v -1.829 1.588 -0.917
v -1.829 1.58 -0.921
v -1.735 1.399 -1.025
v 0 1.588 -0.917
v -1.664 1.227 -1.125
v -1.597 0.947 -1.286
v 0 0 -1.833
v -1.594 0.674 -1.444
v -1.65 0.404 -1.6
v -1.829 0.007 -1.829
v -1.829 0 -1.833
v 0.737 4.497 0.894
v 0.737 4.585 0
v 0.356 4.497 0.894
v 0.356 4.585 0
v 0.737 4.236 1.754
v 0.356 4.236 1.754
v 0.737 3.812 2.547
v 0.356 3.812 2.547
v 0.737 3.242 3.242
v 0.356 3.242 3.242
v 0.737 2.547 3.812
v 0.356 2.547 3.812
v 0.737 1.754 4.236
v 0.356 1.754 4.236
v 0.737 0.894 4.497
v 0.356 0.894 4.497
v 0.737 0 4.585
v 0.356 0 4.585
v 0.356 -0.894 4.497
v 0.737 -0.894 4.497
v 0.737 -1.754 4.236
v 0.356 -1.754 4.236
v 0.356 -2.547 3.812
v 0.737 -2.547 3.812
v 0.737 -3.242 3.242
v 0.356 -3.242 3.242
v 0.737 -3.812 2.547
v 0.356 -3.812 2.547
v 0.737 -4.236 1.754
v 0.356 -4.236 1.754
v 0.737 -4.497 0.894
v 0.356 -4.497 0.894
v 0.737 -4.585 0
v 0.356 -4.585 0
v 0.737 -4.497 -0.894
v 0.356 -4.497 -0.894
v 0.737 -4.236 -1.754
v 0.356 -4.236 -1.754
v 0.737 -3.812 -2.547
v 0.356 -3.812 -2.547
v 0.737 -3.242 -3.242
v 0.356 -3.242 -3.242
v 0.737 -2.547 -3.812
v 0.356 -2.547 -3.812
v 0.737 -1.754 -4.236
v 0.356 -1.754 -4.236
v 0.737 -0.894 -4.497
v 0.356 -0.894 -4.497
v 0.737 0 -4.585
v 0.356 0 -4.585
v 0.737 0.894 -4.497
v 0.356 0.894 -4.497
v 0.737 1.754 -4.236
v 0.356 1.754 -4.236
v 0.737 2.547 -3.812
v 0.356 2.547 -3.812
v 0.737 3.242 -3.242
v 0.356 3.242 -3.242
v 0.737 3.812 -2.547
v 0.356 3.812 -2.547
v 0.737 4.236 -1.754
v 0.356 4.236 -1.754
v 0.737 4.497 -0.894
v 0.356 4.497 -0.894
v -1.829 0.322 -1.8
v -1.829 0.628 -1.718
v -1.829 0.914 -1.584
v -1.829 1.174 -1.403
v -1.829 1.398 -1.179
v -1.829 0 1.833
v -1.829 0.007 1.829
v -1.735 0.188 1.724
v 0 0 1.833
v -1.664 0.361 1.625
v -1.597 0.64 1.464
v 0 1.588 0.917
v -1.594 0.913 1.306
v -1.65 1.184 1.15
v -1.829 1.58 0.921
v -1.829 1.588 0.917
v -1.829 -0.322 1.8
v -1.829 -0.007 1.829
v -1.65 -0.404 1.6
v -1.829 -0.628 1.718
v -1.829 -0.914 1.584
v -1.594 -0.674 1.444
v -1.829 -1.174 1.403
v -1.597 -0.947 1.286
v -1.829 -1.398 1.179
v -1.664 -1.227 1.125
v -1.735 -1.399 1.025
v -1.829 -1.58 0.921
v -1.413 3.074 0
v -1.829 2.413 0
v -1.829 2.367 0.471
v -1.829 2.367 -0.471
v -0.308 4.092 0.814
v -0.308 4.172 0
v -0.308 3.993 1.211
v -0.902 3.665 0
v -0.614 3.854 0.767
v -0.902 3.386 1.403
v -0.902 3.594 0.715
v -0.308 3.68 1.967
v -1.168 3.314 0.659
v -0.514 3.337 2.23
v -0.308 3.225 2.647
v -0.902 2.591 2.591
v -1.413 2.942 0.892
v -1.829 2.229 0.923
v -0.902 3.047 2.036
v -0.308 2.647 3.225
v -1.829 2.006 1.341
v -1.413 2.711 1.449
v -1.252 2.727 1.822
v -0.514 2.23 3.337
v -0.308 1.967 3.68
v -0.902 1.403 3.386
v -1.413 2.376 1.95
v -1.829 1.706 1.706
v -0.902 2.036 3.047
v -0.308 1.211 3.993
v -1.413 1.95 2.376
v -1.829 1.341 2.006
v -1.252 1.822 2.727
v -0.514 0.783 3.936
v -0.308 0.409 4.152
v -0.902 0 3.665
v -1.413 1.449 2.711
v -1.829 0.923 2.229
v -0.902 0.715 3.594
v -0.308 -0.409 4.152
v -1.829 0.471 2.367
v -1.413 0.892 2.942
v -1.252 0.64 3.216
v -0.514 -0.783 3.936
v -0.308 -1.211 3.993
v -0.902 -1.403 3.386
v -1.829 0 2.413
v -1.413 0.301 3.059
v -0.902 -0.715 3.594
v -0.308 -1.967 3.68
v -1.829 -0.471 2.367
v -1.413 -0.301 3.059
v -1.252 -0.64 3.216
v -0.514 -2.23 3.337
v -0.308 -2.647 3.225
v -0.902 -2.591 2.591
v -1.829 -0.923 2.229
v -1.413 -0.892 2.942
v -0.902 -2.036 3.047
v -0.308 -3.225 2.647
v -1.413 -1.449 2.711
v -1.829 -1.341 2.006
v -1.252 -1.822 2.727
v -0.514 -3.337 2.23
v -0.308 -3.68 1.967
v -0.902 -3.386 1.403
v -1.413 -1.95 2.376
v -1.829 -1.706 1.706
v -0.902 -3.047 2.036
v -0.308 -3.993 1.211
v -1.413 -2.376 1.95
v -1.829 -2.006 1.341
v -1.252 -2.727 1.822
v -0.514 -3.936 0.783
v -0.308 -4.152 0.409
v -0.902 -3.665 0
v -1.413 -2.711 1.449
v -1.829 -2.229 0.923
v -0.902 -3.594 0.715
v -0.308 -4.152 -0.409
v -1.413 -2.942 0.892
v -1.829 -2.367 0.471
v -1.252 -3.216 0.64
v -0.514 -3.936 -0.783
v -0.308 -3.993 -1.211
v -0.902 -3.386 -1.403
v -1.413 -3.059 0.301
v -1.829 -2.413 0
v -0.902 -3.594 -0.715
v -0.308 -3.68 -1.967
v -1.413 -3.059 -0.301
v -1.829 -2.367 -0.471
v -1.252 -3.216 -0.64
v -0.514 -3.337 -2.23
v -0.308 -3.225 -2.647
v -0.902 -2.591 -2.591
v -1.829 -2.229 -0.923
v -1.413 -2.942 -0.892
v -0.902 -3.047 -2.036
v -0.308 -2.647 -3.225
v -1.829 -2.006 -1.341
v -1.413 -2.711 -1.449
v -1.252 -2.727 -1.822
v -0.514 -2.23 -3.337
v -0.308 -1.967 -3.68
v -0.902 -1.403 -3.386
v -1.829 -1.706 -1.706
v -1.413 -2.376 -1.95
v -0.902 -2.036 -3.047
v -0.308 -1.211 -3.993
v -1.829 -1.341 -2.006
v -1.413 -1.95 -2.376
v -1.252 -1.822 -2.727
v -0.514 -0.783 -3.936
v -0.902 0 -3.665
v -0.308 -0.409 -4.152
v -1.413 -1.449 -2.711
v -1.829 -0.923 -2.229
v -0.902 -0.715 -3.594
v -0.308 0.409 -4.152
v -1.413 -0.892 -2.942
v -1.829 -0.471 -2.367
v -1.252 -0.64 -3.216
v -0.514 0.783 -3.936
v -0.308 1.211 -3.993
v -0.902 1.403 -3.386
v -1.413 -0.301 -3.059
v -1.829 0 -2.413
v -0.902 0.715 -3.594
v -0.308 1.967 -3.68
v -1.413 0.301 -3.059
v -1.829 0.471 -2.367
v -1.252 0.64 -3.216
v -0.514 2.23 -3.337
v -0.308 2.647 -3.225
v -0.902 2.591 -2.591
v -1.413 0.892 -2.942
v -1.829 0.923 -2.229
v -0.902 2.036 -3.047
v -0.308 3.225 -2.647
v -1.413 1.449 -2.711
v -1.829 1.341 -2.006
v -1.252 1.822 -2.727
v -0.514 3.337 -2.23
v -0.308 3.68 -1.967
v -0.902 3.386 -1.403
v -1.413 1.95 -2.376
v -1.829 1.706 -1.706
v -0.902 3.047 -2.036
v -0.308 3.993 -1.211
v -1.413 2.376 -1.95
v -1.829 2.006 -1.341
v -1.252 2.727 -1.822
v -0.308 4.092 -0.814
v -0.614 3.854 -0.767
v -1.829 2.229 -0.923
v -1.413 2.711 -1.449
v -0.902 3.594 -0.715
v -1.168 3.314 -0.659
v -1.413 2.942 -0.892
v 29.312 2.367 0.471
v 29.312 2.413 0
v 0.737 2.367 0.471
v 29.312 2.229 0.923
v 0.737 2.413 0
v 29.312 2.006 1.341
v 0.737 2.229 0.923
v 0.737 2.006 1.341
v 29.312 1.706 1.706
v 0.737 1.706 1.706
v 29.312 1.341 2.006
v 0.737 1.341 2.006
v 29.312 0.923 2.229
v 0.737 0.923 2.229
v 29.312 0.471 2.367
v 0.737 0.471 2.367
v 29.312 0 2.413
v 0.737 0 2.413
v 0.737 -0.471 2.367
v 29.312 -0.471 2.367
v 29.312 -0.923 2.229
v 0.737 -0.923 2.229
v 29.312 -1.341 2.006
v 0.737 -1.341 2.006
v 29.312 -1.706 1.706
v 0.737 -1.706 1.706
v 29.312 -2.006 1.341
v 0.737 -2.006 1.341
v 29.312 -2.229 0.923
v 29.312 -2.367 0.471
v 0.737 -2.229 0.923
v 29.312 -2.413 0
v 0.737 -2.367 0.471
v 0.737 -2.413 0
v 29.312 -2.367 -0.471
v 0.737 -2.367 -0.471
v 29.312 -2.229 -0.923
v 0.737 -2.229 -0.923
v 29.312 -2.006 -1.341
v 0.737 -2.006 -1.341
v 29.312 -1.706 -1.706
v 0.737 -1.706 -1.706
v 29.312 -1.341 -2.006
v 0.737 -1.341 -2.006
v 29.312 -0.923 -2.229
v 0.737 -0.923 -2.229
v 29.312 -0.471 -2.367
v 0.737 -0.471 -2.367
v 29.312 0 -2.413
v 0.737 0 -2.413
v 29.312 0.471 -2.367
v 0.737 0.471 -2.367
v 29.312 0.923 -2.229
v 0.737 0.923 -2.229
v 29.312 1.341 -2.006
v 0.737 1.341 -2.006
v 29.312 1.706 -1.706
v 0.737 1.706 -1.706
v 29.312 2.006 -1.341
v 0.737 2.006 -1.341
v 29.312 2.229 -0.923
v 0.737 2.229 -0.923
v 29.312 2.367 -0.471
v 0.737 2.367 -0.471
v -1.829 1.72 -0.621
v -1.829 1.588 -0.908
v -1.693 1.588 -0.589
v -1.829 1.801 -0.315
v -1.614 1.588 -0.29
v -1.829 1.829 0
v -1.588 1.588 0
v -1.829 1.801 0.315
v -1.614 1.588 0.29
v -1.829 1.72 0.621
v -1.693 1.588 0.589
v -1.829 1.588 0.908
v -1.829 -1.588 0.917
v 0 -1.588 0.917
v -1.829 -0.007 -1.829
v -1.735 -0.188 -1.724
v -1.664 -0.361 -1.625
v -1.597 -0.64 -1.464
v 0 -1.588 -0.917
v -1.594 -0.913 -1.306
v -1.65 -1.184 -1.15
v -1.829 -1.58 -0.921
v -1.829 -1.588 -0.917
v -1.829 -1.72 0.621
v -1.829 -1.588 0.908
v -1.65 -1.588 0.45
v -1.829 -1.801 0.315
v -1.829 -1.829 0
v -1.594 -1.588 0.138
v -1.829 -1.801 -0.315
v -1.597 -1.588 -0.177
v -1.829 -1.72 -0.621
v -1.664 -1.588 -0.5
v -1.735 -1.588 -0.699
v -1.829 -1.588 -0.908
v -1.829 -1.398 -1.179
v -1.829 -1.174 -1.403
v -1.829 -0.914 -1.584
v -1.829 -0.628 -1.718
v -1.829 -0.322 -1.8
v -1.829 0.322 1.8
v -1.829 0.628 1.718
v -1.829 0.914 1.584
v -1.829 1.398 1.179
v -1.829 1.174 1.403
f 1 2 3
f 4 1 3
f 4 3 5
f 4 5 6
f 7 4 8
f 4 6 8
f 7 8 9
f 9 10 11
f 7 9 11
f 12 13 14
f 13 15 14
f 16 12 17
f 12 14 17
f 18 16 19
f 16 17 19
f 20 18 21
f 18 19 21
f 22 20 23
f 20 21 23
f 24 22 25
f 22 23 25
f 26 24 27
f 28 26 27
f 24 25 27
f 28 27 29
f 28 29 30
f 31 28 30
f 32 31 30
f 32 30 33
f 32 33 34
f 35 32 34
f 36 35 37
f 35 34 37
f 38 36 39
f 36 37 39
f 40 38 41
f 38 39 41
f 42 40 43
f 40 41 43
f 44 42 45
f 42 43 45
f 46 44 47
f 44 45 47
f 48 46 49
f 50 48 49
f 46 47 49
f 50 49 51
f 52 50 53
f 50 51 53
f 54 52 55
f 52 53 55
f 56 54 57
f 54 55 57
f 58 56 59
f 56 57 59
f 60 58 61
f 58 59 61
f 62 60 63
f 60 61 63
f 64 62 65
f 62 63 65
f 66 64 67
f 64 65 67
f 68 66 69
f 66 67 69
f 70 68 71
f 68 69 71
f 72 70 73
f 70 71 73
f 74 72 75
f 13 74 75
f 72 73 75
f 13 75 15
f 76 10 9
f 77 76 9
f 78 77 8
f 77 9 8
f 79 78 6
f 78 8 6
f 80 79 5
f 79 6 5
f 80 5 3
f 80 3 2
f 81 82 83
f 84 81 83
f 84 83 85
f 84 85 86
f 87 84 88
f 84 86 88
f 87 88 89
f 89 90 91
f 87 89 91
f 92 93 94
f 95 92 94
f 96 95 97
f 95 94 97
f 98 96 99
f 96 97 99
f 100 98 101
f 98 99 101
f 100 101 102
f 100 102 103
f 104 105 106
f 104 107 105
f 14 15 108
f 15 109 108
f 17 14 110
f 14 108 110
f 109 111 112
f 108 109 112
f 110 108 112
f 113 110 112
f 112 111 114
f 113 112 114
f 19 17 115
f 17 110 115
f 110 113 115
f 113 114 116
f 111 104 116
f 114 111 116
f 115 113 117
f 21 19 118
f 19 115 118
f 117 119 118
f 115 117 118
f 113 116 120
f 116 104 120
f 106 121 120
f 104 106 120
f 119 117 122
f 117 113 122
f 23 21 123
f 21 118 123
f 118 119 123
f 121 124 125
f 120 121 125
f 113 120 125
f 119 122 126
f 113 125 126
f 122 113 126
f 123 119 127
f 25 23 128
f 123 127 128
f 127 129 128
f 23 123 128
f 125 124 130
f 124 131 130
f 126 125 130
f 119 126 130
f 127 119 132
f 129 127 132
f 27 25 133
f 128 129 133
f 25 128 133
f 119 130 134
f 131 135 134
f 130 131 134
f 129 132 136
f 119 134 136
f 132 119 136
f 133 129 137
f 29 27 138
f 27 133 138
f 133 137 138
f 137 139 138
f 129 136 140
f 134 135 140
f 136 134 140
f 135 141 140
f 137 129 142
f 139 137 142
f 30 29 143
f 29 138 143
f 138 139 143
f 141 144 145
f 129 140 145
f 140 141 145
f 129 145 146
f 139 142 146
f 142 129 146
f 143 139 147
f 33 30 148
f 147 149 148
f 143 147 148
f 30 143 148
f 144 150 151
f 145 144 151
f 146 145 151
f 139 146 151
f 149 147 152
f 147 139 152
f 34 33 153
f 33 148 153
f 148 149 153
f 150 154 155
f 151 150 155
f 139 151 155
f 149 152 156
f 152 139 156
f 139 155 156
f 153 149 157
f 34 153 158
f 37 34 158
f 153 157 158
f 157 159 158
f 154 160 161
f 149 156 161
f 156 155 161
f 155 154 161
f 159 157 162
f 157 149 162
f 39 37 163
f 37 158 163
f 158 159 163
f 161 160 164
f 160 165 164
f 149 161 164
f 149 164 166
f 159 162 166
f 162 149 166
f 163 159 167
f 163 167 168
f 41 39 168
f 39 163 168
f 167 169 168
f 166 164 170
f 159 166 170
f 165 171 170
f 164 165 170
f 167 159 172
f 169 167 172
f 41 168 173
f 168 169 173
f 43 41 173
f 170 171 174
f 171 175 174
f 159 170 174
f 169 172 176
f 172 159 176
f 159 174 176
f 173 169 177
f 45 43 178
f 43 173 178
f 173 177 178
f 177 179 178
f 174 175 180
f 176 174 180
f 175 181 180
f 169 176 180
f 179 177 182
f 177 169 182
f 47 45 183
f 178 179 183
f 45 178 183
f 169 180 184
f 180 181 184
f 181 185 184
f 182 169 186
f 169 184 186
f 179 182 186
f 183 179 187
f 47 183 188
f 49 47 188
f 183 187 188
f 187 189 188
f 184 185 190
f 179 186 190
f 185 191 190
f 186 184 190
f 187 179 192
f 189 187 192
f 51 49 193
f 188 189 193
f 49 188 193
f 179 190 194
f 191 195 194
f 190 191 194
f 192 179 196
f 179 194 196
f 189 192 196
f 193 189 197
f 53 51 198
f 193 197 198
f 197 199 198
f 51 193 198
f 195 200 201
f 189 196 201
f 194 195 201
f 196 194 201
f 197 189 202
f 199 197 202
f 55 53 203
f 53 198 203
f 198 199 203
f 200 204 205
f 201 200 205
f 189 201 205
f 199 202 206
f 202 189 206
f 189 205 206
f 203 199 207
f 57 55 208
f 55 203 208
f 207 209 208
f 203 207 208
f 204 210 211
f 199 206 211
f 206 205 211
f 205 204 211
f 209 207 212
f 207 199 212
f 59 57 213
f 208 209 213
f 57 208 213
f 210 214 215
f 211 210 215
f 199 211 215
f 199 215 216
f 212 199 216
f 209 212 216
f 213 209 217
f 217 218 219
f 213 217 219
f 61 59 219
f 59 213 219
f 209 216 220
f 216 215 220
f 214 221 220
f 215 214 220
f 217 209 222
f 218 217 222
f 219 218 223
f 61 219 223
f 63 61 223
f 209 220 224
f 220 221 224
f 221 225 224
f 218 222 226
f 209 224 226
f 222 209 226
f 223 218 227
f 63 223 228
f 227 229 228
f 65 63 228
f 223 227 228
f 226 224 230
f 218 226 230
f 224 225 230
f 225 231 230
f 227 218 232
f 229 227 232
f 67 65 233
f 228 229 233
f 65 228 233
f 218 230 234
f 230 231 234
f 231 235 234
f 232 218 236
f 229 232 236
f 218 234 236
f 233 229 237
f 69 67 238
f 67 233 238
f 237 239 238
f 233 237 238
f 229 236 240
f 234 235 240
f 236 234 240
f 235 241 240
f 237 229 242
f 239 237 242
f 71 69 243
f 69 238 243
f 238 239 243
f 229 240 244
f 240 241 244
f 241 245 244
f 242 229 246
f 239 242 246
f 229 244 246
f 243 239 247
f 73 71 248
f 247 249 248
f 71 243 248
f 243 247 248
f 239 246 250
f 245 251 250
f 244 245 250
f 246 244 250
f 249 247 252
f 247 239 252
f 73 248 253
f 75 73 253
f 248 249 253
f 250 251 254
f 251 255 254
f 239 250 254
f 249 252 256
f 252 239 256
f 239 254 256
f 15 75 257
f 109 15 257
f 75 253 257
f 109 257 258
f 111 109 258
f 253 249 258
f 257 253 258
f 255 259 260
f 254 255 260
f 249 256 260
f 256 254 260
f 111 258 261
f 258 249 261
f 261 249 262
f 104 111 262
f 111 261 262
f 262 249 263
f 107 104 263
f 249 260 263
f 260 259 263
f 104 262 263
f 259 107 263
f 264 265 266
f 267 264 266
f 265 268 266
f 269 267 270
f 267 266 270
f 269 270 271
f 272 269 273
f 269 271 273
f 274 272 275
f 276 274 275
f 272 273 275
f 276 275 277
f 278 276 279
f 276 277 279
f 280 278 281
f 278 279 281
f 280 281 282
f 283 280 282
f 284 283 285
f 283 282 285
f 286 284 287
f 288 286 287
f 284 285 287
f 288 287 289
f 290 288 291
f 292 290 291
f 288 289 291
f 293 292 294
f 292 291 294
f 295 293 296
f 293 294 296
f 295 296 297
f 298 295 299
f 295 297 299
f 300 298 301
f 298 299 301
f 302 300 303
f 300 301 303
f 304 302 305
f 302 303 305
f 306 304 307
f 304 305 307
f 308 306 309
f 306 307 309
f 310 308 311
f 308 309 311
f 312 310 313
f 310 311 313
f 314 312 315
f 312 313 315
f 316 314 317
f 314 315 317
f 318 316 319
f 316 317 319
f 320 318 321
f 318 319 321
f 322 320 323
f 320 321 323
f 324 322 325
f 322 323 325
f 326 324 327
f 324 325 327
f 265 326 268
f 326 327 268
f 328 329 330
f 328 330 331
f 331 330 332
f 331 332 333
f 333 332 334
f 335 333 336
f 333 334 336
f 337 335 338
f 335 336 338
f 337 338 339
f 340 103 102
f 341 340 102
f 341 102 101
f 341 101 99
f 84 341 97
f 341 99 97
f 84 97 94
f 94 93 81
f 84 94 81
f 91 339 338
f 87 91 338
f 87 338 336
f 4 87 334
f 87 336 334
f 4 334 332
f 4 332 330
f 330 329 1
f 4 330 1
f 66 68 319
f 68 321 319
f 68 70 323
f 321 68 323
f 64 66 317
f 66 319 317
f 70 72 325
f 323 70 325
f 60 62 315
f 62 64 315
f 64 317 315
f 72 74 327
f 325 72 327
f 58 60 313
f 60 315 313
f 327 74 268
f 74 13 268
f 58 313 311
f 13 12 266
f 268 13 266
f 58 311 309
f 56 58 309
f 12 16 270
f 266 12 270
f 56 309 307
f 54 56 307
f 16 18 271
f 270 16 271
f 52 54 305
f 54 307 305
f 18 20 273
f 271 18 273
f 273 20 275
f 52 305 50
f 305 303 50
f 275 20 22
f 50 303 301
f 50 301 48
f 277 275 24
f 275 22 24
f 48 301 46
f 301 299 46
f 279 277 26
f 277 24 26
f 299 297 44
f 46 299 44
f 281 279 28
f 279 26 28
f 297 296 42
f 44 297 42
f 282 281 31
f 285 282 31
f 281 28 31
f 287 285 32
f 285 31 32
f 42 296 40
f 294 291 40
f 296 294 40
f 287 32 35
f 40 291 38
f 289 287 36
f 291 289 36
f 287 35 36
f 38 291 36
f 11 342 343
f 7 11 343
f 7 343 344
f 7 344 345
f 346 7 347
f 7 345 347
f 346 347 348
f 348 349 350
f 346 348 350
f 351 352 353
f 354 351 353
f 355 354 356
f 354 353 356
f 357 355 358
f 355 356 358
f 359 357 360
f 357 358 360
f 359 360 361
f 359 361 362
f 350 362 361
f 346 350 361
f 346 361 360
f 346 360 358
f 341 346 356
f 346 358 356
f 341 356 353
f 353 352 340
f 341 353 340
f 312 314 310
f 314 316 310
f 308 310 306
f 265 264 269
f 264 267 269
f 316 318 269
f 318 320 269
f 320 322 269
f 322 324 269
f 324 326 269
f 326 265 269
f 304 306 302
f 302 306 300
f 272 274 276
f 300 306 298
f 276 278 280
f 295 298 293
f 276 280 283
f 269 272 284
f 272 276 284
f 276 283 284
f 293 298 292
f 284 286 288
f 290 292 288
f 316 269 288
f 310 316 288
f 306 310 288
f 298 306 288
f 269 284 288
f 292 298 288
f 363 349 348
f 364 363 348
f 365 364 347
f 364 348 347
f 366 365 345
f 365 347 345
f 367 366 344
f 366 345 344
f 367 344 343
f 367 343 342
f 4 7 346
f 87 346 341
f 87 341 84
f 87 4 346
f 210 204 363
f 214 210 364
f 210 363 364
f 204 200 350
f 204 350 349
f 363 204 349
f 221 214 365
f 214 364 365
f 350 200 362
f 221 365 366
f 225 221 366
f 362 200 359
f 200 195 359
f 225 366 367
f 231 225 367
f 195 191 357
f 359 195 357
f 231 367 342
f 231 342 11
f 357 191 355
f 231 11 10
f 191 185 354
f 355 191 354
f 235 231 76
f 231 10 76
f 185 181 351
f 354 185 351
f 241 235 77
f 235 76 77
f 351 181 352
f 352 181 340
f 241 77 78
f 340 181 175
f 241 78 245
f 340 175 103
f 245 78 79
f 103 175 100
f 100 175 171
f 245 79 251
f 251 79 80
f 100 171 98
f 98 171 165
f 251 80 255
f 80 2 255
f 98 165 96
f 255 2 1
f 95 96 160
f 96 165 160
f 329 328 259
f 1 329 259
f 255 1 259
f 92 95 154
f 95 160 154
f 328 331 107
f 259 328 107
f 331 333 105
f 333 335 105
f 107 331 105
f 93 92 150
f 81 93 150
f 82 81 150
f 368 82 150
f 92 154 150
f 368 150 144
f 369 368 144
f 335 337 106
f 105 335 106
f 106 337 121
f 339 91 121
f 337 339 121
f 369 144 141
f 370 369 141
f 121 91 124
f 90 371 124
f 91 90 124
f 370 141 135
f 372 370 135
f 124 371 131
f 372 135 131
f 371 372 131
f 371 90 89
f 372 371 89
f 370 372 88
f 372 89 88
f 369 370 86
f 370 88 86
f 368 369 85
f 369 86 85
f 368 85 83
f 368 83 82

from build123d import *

# Parameters (mm, degrees)
CUT_EXTRUDE1_DEPTH = 1.8288


with BuildPart() as part:
    # Sketch1 → Revolve1 (revolve)
    with BuildSketch(Plane.XY):
        with BuildLine():
            Line((0, 0), (29.3116, 0))
            Line((29.3116, 0), (29.3116, 2.413))
            Line((29.3116, 2.413), (0.7366, 2.413))
            Line((0.7366, 2.413), (0.7366, 4.5847))
            Line((0.7366, 4.5847), (0.3556, 4.5847))
            ThreePointArc((0.3556, 4.5847), (-0.901703741, 3.66491926), (-1.8288, 2.413))
            Line((-1.8288, 2.413), (-1.8288, 1.8288))
            Line((-1.8288, 1.8288), (0, 0))
        make_face()
    revolve(axis=Axis((0, 0, 0), (1, 0, 0)))

    # Sketch2 → Cut-Extrude1 (cut)
    with BuildSketch(Plane.ZY.offset(1.8288)):
        Polygon((1.833087105, 0), (0.916543552, 1.5875), (-0.916543552, 1.5875), (-1.833087105, 0), (-0.916543552, -1.5875), (0.916543552, -1.5875), align=None)
    extrude(amount=-CUT_EXTRUDE1_DEPTH, mode=Mode.SUBTRACT)


solid = part.part
